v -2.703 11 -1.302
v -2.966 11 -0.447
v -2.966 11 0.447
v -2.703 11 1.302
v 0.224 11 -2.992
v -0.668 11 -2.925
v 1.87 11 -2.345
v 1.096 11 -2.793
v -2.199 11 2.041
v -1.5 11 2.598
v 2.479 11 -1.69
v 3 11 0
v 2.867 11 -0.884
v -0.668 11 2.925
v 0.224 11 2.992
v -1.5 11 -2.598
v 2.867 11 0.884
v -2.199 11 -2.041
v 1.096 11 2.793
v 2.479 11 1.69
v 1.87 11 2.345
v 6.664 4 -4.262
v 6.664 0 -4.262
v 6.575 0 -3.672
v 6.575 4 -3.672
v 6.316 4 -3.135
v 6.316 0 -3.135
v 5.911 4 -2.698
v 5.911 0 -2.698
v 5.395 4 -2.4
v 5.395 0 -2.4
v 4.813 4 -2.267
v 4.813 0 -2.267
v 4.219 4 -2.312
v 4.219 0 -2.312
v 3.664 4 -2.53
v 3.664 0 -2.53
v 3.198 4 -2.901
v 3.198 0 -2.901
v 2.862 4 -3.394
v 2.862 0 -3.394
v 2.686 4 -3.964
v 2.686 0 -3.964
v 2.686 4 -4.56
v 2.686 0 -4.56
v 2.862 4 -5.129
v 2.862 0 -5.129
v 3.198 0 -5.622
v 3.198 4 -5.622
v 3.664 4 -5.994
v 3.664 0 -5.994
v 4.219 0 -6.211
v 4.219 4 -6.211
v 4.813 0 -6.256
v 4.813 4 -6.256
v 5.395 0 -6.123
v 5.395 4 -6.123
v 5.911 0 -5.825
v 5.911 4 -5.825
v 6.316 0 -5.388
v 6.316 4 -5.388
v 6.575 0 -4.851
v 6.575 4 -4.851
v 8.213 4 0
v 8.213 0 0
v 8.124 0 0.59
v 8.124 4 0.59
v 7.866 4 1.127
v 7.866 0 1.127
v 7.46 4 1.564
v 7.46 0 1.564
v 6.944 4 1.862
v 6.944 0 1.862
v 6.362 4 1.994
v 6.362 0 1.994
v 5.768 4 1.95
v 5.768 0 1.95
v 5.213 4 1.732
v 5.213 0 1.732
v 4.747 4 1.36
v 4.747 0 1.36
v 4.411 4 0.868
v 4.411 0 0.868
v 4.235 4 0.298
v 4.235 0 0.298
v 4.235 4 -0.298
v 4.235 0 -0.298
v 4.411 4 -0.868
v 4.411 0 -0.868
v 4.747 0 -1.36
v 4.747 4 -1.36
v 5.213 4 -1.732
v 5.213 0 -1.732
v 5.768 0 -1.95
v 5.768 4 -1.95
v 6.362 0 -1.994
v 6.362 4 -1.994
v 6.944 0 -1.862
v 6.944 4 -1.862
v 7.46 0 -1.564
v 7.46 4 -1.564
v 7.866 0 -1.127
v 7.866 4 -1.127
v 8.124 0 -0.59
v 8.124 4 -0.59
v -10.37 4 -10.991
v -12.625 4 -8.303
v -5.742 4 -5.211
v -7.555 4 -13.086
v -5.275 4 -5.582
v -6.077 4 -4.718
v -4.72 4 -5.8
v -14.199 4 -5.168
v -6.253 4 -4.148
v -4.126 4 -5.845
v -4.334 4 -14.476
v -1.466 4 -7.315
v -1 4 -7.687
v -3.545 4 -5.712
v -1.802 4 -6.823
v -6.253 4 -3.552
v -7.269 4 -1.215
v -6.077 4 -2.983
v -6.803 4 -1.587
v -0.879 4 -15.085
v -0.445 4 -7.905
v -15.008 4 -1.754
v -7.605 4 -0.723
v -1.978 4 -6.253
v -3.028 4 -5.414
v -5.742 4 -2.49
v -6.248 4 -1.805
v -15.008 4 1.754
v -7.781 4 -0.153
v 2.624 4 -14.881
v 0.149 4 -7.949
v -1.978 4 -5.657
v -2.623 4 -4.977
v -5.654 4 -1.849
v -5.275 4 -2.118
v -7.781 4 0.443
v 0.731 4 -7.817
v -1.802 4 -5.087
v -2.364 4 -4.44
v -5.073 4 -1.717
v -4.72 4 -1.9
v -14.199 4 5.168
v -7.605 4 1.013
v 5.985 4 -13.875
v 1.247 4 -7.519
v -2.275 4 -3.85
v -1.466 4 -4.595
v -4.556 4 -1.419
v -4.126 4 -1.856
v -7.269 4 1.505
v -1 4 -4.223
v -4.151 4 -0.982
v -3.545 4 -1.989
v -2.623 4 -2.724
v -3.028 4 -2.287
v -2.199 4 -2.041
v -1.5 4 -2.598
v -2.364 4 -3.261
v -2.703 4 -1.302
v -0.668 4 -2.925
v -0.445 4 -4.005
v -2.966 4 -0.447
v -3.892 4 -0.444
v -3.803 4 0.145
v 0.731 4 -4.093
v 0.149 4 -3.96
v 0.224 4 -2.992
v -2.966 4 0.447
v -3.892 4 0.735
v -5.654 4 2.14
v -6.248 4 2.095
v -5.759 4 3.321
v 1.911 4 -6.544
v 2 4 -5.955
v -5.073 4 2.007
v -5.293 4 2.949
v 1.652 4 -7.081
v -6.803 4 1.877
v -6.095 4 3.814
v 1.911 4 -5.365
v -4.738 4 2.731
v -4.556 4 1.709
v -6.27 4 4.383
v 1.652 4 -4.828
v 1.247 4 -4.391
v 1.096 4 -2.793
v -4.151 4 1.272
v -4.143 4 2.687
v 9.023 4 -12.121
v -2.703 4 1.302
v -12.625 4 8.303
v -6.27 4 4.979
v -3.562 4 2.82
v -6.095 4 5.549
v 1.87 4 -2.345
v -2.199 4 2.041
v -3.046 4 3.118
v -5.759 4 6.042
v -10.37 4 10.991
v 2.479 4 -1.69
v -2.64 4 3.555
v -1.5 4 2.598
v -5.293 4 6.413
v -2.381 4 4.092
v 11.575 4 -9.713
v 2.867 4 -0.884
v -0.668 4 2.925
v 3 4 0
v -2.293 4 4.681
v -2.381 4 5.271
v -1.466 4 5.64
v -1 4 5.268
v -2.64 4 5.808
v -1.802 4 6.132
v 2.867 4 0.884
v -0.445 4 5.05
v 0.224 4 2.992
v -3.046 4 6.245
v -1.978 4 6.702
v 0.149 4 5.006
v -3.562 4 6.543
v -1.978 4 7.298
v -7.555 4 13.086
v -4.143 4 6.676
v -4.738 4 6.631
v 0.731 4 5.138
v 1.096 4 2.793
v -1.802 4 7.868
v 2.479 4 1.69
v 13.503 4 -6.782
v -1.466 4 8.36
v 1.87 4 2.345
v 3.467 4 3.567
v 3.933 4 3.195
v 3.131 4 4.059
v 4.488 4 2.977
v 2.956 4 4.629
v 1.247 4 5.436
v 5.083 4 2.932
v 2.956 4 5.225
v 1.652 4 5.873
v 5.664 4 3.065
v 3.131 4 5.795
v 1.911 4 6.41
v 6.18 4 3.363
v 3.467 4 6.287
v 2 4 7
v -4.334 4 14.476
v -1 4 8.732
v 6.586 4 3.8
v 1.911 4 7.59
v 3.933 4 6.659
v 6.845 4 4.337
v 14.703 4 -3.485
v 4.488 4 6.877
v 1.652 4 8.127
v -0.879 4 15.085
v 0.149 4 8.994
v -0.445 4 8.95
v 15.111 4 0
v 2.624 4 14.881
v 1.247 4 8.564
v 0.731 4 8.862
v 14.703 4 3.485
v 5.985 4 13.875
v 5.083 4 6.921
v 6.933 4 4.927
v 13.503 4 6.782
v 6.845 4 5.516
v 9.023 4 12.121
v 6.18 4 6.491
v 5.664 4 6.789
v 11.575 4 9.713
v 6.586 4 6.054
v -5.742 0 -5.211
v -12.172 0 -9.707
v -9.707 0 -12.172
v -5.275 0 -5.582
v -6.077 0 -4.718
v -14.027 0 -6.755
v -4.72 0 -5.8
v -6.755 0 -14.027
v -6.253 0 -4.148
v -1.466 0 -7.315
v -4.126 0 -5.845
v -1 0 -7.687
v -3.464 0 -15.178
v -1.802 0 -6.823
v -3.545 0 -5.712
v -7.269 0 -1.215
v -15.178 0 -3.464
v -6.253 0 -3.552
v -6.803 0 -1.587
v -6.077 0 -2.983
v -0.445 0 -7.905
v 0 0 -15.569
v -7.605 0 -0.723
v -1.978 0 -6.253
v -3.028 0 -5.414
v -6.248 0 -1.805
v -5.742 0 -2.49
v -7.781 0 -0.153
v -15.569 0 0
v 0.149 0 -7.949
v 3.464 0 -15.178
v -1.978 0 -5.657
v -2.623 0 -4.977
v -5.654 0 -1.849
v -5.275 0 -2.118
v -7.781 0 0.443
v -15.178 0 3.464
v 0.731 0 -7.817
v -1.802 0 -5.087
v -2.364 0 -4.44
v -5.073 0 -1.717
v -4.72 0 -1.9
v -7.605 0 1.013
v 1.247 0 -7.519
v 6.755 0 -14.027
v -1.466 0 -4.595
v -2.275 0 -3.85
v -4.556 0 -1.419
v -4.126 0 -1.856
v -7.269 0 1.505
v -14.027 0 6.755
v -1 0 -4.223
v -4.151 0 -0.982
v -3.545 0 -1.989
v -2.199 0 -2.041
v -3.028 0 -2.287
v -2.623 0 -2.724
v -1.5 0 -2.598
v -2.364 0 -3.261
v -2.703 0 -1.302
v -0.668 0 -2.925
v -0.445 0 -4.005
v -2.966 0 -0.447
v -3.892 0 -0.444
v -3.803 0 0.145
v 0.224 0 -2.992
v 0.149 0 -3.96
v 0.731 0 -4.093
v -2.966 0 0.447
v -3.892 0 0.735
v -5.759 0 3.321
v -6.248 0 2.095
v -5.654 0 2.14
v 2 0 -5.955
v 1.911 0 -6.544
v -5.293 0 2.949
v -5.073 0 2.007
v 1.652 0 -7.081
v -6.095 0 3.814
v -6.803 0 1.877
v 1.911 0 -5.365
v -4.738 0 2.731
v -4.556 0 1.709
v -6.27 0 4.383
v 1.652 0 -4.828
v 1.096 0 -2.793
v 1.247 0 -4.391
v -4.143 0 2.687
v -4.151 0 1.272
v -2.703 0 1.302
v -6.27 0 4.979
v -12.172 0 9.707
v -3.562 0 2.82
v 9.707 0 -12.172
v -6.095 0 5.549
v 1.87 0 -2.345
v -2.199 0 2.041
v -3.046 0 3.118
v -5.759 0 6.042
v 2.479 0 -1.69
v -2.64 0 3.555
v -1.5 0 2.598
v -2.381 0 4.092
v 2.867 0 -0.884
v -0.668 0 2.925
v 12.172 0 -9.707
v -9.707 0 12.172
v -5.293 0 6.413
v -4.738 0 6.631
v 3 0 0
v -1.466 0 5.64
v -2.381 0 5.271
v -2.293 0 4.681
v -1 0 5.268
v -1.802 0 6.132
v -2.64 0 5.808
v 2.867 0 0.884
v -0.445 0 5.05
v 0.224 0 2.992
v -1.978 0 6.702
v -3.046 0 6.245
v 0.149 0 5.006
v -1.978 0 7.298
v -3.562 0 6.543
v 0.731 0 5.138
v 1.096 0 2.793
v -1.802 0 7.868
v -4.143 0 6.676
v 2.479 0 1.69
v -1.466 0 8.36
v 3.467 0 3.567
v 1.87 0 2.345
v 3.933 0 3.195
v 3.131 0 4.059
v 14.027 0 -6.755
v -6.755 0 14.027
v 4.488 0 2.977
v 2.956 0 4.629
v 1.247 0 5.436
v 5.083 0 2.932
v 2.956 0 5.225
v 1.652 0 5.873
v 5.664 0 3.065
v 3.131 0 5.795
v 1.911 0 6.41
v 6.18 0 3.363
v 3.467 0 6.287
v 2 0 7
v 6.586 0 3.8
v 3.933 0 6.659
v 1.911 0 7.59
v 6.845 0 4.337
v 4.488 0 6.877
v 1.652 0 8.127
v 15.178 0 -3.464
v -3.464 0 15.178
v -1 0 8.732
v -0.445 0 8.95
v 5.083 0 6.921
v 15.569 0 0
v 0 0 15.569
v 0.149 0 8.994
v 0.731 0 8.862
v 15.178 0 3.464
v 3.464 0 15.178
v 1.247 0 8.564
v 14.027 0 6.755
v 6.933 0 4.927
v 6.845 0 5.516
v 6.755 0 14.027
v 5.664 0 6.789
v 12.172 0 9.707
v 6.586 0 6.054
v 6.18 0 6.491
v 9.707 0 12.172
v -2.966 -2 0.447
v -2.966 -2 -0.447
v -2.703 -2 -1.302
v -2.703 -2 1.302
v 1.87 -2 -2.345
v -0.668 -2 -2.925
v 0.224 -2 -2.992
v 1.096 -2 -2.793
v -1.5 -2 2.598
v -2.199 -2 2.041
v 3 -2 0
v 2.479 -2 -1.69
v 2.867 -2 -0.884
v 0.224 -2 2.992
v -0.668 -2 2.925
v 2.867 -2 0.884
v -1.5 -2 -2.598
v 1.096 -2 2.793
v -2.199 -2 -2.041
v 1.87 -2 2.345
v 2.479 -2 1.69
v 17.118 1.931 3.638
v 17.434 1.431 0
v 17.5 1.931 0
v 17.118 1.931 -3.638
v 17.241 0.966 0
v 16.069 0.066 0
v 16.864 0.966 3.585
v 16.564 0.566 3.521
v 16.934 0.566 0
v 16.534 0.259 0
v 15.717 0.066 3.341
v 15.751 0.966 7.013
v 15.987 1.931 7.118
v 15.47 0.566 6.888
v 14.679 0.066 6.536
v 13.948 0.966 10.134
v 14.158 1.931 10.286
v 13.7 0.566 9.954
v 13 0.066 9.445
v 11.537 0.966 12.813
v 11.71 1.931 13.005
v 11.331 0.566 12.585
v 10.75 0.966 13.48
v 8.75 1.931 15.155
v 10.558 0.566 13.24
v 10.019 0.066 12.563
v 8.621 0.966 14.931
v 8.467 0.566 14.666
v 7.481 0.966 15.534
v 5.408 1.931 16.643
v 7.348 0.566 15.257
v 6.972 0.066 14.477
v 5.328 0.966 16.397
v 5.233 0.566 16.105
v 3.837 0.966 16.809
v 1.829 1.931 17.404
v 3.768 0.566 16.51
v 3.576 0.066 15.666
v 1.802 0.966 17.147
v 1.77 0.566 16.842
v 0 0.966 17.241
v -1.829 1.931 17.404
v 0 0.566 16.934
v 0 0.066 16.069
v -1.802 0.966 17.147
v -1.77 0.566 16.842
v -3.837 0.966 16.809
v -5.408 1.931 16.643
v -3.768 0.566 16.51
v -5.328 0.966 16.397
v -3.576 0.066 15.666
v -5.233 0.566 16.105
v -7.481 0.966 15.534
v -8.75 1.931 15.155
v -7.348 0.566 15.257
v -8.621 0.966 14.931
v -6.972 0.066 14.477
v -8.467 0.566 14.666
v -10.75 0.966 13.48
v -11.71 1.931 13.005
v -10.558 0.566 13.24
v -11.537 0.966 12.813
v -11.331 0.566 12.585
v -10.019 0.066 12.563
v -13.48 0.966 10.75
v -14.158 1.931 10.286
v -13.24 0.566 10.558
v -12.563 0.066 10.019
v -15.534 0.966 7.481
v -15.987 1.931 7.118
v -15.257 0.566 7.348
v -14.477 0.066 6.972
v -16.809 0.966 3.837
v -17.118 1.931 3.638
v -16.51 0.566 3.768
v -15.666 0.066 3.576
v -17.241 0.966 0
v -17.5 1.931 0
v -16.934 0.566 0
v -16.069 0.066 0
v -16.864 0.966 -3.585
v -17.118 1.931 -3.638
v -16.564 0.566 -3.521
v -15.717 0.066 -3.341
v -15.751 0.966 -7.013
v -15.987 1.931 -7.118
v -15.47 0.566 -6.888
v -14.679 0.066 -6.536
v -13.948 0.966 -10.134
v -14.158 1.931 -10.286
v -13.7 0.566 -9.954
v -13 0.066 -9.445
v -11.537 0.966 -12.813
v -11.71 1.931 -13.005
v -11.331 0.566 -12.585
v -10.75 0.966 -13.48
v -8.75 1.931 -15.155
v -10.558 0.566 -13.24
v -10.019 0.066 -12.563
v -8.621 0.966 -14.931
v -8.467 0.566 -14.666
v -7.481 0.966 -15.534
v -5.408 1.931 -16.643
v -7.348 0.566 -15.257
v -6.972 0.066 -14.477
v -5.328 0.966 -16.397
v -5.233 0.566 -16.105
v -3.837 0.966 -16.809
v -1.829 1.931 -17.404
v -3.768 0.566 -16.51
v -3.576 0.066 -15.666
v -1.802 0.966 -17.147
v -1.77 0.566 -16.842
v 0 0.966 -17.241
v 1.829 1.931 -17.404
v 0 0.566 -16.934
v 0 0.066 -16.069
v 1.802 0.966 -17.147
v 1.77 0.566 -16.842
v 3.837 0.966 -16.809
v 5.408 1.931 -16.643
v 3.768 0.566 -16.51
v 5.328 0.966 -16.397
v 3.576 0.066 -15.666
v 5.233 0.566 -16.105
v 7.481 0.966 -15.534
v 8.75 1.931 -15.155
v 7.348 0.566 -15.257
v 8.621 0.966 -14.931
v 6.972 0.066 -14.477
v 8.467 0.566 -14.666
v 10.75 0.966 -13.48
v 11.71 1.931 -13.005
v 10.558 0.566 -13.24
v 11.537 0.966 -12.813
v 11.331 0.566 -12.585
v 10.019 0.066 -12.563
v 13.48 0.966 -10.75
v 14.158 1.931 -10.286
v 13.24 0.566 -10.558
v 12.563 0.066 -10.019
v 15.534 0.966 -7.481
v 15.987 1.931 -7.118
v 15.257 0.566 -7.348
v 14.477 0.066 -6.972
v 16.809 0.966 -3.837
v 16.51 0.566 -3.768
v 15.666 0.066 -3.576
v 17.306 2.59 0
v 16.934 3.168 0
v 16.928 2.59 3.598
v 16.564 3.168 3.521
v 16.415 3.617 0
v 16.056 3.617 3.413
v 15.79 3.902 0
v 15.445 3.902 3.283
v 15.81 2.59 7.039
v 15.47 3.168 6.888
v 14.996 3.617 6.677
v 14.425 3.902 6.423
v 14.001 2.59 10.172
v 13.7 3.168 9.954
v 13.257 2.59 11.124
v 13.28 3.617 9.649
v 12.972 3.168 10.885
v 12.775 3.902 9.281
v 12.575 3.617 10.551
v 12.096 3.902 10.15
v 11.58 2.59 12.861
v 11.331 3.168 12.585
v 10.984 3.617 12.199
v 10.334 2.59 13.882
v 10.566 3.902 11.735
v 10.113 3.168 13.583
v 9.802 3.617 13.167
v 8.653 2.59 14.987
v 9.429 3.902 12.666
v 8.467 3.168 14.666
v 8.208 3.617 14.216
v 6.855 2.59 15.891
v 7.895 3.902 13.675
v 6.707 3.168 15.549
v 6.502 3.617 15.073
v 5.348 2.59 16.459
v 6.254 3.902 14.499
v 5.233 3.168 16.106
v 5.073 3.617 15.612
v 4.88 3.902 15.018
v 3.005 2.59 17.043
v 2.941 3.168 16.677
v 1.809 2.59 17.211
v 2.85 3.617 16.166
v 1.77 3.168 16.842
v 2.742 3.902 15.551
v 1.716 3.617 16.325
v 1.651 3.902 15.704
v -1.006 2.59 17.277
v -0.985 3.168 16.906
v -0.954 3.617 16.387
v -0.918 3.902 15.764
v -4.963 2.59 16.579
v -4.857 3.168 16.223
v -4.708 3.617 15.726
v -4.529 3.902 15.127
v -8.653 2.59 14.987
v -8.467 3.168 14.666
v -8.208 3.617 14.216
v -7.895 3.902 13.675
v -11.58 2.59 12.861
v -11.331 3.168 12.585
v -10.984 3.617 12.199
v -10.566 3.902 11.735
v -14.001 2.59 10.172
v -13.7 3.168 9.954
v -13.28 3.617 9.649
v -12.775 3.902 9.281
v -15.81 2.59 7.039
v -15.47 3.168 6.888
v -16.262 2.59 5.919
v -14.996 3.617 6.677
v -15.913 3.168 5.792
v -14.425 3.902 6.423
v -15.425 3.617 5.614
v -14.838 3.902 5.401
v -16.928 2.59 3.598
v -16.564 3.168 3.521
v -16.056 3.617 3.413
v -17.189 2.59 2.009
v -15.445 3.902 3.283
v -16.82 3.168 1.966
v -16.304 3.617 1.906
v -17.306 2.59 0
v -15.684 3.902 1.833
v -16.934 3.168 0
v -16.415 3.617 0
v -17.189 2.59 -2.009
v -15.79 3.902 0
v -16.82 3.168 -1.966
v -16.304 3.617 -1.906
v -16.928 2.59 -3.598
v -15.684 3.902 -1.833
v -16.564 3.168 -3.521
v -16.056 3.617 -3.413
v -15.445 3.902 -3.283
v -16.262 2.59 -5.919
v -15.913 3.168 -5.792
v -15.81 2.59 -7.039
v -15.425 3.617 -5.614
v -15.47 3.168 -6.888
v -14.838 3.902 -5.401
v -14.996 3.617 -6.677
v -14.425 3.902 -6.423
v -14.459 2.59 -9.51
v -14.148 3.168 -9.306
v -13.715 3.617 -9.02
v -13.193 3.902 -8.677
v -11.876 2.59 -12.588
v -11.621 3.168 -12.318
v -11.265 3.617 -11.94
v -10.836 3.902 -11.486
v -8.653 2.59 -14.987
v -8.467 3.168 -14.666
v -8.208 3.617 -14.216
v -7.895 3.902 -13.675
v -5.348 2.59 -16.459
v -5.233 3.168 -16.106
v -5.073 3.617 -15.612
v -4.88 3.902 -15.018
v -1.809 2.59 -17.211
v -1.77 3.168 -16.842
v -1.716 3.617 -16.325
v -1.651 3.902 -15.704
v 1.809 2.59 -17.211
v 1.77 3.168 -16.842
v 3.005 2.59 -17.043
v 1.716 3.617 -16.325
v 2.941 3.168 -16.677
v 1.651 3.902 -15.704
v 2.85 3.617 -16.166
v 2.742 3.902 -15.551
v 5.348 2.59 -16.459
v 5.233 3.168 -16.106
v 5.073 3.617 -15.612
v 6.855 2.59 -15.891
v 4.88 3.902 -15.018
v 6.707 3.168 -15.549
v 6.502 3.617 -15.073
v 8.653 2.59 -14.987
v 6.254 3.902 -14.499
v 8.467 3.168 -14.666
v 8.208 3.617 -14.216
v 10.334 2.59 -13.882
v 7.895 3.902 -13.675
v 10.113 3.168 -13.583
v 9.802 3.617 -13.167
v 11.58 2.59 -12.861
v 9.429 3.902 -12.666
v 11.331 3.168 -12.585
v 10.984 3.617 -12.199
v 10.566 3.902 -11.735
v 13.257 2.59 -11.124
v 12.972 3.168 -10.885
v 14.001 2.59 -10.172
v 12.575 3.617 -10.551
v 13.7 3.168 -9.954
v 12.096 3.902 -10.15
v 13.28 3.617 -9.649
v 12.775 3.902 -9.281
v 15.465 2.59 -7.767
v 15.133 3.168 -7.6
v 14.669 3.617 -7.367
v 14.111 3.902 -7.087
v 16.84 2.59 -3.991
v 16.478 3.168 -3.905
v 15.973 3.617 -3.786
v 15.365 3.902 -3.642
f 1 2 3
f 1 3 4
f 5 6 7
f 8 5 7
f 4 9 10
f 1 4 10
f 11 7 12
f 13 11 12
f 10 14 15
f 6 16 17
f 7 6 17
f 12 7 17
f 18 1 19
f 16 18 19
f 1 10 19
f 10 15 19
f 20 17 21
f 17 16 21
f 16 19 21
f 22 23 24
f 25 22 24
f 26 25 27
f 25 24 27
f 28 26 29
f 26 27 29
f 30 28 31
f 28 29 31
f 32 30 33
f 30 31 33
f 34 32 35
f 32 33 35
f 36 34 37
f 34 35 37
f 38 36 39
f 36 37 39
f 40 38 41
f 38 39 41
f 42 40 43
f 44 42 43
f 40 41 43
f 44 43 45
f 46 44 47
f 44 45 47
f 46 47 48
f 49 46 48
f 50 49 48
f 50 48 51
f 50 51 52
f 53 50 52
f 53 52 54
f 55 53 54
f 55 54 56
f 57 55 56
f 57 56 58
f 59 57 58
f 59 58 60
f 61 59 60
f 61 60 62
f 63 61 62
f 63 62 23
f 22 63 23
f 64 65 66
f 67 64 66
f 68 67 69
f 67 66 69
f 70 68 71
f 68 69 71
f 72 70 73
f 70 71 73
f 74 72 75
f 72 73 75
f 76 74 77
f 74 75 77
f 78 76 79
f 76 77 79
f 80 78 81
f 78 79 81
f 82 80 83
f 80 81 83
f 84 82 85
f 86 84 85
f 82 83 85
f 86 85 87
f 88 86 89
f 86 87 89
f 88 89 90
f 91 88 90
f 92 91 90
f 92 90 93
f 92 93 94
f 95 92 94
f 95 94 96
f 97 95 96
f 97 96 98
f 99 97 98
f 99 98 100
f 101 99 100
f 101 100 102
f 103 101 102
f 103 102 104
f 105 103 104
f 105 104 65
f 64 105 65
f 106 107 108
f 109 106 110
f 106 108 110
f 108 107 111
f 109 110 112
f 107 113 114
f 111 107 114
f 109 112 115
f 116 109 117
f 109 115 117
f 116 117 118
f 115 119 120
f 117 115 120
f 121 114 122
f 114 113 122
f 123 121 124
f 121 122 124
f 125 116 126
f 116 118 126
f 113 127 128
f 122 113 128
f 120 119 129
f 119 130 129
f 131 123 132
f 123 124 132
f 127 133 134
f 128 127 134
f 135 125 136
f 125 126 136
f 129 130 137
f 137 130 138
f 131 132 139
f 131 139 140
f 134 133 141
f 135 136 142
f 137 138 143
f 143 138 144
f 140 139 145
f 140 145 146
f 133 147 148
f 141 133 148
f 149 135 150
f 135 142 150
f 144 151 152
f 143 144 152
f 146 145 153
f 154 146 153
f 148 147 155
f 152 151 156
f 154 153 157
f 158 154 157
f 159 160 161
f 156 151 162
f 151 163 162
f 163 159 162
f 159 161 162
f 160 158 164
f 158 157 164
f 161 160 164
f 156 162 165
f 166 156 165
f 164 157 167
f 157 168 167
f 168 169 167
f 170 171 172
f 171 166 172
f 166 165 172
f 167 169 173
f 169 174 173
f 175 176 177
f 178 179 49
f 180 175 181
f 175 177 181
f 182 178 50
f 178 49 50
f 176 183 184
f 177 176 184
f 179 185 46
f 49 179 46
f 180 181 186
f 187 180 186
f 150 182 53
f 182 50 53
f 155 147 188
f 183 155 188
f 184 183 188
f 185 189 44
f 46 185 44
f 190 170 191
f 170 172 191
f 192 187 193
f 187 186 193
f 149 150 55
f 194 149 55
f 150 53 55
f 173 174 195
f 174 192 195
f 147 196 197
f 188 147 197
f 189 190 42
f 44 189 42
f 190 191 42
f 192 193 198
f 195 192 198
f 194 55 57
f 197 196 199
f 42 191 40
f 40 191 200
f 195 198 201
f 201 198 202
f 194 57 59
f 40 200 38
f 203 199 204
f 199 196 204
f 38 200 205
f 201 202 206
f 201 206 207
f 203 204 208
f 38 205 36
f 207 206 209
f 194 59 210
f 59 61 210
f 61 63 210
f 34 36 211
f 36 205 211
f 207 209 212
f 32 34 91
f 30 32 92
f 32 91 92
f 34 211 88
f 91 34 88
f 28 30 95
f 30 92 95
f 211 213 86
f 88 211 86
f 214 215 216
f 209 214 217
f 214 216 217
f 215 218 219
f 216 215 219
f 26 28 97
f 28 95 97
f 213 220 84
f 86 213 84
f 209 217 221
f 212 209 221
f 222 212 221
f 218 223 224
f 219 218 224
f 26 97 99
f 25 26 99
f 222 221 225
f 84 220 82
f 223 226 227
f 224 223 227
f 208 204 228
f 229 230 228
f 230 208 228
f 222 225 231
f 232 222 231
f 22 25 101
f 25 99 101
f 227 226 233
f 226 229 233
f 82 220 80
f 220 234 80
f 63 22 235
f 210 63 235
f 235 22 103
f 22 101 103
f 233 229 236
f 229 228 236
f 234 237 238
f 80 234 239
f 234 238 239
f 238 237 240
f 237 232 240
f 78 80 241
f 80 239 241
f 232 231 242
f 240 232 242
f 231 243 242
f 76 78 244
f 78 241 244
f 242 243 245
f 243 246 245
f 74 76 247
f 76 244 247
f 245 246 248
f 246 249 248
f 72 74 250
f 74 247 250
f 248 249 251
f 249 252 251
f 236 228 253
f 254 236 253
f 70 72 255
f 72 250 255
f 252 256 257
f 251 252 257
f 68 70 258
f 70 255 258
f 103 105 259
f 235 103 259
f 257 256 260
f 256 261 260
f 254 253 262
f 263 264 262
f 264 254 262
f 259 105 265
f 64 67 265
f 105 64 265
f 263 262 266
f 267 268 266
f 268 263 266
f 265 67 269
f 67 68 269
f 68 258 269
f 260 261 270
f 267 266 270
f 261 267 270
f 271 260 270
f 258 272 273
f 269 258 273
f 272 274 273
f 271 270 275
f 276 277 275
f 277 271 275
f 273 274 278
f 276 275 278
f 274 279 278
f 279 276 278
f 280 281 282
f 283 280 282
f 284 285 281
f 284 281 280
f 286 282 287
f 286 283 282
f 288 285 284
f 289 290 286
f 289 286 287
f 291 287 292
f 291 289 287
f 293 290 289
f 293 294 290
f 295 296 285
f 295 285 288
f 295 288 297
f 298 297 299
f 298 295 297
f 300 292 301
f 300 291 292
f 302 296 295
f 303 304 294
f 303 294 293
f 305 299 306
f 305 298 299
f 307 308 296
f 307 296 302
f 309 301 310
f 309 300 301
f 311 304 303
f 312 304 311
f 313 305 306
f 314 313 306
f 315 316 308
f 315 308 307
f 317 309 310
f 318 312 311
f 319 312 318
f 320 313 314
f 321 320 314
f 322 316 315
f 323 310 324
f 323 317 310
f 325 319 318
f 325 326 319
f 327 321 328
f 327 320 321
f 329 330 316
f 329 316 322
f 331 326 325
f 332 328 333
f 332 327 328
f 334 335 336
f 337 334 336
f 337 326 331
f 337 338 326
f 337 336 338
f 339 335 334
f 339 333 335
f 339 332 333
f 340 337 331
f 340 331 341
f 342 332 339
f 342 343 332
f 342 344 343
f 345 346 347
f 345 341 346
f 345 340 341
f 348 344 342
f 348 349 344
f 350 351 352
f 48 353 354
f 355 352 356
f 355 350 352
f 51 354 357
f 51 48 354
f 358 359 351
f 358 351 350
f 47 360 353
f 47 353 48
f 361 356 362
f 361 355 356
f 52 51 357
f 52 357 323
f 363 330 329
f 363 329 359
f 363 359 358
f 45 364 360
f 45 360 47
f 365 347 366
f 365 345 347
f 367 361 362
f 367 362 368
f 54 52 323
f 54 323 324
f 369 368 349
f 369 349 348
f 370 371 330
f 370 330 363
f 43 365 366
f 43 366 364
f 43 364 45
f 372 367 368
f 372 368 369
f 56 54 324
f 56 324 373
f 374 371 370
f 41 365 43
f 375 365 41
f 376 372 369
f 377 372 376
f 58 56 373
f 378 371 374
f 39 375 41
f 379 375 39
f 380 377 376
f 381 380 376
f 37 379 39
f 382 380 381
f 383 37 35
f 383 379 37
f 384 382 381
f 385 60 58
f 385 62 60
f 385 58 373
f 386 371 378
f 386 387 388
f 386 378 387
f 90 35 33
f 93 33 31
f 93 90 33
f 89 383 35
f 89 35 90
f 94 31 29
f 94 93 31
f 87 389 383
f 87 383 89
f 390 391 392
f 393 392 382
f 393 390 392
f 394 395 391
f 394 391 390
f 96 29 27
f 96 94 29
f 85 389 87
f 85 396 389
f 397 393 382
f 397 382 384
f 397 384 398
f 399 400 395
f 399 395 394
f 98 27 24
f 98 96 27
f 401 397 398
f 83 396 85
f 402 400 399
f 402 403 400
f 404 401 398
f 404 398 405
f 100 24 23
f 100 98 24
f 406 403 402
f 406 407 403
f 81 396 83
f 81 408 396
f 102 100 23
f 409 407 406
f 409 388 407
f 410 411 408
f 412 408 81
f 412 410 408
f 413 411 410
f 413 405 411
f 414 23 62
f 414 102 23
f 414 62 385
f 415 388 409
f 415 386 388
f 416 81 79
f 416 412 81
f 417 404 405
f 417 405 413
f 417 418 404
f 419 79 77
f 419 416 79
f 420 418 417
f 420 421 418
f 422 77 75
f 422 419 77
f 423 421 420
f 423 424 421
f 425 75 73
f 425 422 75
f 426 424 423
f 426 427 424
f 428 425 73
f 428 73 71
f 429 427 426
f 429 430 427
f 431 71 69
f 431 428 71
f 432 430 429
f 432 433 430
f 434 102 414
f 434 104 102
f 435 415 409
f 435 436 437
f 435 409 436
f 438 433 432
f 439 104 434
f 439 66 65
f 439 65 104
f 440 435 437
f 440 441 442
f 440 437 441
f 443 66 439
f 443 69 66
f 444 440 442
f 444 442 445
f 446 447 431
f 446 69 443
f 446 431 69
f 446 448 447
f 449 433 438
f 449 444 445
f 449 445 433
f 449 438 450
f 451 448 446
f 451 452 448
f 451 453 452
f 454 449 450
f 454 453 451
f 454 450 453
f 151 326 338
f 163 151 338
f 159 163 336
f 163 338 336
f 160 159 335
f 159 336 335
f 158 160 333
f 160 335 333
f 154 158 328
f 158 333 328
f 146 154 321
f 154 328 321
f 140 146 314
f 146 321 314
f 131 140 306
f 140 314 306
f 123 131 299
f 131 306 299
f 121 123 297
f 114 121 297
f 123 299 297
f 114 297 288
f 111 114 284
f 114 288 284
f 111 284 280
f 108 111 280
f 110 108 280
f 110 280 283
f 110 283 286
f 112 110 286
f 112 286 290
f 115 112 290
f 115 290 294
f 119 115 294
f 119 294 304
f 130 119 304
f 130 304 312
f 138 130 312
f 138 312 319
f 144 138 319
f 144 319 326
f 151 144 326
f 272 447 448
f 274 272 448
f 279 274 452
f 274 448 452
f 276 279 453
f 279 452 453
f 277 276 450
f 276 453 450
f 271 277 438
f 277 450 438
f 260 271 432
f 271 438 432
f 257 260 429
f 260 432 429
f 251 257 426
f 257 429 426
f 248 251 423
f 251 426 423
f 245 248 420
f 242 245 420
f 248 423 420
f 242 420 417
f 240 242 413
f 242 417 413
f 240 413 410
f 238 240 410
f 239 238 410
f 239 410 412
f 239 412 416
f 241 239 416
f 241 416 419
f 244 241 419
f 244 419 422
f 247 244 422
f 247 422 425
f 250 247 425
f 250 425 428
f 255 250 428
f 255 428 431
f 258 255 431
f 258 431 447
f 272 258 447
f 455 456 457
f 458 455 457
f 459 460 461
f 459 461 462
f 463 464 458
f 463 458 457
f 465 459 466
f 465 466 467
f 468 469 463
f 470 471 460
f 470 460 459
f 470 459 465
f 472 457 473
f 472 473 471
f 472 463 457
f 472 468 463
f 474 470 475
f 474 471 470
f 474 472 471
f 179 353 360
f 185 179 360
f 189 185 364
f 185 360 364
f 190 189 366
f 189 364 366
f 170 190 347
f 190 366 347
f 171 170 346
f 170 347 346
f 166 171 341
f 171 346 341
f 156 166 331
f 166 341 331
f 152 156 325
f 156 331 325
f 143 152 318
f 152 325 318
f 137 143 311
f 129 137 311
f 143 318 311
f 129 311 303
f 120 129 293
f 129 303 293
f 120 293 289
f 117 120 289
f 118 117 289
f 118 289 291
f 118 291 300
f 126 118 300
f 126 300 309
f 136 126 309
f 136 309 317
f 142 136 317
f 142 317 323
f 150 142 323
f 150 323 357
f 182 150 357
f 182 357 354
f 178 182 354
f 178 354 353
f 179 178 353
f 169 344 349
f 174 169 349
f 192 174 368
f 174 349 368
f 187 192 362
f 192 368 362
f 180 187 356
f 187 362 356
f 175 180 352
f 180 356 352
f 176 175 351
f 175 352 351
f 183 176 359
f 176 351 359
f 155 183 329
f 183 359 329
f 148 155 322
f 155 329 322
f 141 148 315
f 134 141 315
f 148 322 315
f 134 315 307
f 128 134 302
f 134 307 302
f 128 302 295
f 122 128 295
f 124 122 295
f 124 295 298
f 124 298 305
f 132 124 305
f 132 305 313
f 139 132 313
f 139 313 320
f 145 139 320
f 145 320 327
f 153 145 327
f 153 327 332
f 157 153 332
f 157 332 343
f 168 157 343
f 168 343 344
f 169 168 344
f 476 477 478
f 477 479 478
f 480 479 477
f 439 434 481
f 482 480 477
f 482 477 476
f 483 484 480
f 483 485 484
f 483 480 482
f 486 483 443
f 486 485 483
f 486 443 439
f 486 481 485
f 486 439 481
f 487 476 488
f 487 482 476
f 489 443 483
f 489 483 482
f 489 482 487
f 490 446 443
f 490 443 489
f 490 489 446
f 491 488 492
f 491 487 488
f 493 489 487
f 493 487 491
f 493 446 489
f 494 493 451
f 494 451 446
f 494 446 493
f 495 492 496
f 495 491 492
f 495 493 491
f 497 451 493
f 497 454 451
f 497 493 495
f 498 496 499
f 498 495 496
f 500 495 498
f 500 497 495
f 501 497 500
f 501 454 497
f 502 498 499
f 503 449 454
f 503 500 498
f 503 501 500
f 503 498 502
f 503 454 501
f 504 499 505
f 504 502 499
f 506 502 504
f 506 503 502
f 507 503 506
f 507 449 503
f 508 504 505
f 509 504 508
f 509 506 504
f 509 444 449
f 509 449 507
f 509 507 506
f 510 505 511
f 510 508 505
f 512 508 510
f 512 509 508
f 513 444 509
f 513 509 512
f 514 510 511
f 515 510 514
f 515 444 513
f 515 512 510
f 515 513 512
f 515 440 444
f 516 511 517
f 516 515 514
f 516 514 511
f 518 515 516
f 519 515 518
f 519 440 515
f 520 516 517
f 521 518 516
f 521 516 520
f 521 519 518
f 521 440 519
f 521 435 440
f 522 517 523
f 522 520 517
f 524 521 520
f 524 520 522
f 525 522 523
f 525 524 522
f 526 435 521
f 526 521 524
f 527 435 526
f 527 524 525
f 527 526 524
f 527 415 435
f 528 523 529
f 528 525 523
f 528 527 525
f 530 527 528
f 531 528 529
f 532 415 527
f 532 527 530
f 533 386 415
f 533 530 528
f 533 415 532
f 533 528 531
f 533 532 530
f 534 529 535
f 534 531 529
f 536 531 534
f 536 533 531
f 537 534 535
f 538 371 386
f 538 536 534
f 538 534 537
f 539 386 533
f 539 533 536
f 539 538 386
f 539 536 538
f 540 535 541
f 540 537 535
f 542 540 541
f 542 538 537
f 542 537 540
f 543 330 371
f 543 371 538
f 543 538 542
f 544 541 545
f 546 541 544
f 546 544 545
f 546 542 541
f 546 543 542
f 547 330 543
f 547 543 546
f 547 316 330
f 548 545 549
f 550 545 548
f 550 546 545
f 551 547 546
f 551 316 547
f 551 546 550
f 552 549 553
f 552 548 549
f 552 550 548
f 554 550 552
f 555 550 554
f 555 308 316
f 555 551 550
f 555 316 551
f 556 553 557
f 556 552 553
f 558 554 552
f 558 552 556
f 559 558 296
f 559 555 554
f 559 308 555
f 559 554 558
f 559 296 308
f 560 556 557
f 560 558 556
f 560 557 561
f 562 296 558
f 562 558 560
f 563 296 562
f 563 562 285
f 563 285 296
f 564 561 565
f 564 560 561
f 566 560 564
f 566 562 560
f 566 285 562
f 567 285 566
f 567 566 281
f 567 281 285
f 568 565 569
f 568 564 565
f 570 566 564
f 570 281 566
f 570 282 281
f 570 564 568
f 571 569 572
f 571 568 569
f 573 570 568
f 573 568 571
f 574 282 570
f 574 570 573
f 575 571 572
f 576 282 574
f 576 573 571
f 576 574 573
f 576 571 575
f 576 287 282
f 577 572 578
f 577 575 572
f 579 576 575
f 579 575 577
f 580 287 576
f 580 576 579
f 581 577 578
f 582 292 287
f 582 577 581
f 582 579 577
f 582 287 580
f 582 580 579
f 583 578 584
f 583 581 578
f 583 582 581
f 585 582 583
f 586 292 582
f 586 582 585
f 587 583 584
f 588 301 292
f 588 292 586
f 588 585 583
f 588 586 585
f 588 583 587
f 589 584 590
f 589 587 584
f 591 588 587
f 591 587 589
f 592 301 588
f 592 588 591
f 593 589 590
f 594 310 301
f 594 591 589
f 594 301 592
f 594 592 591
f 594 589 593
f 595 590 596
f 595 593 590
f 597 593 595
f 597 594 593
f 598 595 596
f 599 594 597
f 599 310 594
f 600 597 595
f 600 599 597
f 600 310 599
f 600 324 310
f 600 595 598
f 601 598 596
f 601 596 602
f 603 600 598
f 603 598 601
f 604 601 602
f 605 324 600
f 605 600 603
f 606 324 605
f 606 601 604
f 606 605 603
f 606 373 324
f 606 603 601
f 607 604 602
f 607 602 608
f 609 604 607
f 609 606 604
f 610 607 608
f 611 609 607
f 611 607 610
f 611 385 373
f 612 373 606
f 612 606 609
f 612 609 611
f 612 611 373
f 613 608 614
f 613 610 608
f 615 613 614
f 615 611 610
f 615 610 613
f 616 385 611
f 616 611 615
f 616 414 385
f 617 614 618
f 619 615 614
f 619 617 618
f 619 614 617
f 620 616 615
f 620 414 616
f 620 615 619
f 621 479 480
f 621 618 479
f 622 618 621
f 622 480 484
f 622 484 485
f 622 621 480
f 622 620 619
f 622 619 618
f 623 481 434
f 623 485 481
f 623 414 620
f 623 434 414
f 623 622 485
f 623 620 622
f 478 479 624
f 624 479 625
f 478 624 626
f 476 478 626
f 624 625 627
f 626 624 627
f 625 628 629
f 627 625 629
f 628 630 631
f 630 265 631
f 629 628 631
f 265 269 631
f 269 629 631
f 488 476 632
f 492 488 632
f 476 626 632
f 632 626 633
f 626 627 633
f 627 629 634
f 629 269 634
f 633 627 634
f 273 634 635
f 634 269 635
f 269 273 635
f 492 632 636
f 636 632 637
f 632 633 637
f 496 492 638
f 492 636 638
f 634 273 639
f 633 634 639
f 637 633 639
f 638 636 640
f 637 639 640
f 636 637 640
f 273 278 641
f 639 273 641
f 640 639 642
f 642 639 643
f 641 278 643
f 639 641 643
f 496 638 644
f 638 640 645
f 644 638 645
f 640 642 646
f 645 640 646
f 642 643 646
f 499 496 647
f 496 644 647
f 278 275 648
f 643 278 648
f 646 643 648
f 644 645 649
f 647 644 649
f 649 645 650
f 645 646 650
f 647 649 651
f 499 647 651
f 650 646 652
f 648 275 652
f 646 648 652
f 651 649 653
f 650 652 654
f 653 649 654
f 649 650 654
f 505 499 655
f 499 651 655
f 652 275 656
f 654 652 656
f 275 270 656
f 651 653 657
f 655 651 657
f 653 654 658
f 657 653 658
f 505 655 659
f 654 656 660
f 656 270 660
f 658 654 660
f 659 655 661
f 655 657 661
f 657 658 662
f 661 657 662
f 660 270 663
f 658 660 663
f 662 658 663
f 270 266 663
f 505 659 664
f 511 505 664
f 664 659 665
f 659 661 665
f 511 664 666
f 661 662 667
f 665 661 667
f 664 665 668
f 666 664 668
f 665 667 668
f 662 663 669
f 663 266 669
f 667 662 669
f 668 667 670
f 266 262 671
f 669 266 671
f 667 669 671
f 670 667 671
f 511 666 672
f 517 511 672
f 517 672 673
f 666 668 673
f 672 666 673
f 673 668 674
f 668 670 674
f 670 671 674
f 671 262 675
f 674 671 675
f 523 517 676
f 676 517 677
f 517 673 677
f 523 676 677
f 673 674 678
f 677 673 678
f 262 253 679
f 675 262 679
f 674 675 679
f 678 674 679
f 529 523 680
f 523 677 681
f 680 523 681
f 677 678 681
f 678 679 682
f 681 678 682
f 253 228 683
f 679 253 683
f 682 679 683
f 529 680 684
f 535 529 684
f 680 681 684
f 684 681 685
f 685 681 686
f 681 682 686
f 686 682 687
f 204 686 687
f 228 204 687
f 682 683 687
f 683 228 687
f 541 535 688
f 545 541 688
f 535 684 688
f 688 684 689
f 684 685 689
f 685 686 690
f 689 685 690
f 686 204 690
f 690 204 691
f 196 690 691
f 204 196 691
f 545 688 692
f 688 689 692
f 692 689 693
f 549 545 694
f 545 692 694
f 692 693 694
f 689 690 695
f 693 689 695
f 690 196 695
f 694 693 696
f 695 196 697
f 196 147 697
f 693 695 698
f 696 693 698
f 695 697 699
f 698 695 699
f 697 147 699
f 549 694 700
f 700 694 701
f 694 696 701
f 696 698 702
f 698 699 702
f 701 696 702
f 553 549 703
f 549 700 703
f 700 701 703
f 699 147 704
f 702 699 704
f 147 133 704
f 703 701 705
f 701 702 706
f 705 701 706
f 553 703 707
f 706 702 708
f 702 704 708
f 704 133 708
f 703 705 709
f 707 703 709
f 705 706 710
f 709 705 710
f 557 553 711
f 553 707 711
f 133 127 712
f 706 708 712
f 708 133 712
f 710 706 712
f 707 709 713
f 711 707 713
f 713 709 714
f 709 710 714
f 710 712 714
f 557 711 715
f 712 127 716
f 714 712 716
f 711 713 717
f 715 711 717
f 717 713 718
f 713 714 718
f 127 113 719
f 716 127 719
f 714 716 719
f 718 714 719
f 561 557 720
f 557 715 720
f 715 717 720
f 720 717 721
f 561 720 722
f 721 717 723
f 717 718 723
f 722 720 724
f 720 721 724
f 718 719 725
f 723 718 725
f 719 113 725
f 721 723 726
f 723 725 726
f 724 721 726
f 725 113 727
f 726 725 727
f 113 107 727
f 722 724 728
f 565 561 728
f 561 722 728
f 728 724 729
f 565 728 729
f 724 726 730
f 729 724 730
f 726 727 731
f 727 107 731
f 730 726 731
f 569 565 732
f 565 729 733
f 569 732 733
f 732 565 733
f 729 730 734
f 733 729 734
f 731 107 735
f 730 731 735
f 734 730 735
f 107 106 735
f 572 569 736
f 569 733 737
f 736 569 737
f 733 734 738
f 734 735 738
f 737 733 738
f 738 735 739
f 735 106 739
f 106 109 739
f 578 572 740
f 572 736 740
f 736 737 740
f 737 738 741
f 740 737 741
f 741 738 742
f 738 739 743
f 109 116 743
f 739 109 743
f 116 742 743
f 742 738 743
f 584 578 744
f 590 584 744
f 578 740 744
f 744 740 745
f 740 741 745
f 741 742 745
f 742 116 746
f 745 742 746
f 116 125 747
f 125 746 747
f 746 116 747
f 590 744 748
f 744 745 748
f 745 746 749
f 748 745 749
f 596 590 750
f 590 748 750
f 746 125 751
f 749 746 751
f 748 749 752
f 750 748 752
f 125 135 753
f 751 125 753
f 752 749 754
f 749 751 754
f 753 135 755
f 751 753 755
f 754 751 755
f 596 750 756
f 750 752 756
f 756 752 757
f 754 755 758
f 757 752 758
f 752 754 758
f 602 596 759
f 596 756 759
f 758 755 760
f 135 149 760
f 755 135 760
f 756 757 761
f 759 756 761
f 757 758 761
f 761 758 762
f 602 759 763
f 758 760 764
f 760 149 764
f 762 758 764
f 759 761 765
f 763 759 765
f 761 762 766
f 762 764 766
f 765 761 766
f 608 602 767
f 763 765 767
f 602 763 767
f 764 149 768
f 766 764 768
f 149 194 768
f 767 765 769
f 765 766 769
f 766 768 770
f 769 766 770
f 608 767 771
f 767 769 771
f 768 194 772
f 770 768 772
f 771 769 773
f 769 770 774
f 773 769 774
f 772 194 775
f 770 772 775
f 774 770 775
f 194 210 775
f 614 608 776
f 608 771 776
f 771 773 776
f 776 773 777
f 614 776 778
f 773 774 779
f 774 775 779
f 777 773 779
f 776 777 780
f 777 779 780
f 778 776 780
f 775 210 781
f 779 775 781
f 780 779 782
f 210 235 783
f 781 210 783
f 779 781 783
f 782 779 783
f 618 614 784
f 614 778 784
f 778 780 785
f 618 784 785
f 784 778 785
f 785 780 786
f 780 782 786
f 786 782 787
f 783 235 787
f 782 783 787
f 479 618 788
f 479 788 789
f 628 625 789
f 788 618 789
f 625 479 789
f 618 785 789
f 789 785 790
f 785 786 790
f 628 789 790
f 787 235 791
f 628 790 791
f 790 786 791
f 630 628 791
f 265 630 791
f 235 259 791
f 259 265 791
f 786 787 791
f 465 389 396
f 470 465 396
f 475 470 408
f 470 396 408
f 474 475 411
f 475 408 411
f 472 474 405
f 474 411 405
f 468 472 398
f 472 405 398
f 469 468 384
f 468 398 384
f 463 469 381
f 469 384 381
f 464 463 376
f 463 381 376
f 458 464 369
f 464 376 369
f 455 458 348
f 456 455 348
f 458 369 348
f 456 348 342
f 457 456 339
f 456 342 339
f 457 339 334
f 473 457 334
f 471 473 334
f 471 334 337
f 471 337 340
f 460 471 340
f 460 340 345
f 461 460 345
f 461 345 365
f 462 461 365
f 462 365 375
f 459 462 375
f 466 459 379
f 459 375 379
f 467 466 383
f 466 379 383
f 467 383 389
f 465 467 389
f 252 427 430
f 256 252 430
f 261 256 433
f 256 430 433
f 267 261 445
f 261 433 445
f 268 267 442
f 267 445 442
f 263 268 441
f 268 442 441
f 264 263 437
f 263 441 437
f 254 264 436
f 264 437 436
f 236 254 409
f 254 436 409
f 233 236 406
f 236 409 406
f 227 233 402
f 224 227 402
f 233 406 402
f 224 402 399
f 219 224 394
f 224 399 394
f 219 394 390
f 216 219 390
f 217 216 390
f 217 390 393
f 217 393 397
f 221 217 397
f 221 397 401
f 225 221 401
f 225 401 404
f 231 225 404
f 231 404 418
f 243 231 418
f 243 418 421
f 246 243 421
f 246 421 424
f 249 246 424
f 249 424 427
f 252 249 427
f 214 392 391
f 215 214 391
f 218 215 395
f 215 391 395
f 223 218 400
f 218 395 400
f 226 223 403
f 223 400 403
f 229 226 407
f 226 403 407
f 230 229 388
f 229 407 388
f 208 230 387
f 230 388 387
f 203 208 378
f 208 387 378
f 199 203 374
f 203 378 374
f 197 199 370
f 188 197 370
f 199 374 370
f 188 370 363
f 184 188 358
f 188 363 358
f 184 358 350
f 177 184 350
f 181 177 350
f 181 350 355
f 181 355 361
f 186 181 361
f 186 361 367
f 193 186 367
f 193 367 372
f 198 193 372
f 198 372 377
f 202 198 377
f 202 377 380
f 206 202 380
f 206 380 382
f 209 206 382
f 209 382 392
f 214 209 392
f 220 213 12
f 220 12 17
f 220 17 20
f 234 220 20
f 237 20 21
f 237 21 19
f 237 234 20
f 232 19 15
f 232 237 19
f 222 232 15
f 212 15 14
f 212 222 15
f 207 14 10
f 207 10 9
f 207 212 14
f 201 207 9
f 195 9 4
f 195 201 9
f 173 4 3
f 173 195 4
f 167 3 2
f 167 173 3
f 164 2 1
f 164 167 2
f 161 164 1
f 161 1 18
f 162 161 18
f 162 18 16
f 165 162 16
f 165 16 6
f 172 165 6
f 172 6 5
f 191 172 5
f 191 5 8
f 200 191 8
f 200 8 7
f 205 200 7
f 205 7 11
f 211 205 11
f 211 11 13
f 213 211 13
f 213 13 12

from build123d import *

# Parameters (mm, degrees)
F0_R     = 3
F1_DEPTH = 11
F3_DEPTH = 2
F2_R     = 17.5
F4_DEPTH = 4
F5_R     = 1.9313708499
F7_R     = 2
F8_DEPTH = 6.5


# Not quite as in the source:
# - a fillet or chamfer that OpenCascade refuses, or shapes differently, is made with other operations: its cross-section is extruded or revolved along the edge and cut away or added


with BuildPart() as f1:
    # F0 (on Front) → F1 (new body)
    with BuildSketch(Plane.XZ):
        Circle(F0_R)
    extrude(amount=-F1_DEPTH)

    # F0 (on Front) → F3 (join)
    with BuildSketch(Plane.XZ):
        Circle(F0_R)
    extrude(amount=F3_DEPTH)

    # F2 (on Front) → F4 (join)
    with BuildSketch(Plane.XZ):
        Circle(F2_R)
    extrude(amount=-F4_DEPTH)

    # F5
    f5_edges = [f1.edges().sort_by_distance(p)[0] for p in [
        (-17.5, 0, 0),
    ]]
    fillet(f5_edges, radius=F5_R)

    # F6: fillet of radius 2.4142135624 on 1 edges, made by hand

    # F6_s1 → F6_t2 (revolve, cut)
    with BuildSketch(Plane.XY):
        with BuildLine():
            ThreePointArc((17.5, 1.9313708499), (16.6908565976, 3.4109907686), (15.1106489294, 4))
            Line((15.1106489294, 4), (15.1106489294, 4.0482842712))
            Line((15.1106489294, 4.0482842712), (17.5, 4.0482842712))
            Line((17.5, 4.0482842712), (17.5482842712, 4))
            ThreePointArc((17.5482842712, 4), (17.5482842712, 2.9656854249), (17.5477870214, 1.9382825381))
            Line((17.5477870214, 1.9382825381), (17.5, 1.9313708499))
        make_face()
    revolve(axis=Axis((0, 4, 0), (0, -1, 0)), mode=Mode.SUBTRACT)

    # F7 (on face) → F8 (cut)
    with BuildSketch(Plane.XZ):
        with Locations((0, -5.9548519258)):
            Circle(F7_R)
        with Locations((6.2130242586, 0)):
            Circle(F7_R)
        with Locations((4.9334257519, 4.926879719)):
            Circle(F7_R)
        with Locations((0, 7)):
            Circle(F7_R)
        with Locations((4.6638702957, -4.2616006167)):
            Circle(F7_R)
        with Locations((-4.2754073071, -3.8503200899)):
            Circle(F7_R)
        with Locations((-4.2925996605, 4.681295439)):
            Circle(F7_R)
        with Locations((-5.8032550169, 0.1451130412)):
            Circle(F7_R)
    extrude(amount=-F8_DEPTH, mode=Mode.SUBTRACT)


solid = f1.part
